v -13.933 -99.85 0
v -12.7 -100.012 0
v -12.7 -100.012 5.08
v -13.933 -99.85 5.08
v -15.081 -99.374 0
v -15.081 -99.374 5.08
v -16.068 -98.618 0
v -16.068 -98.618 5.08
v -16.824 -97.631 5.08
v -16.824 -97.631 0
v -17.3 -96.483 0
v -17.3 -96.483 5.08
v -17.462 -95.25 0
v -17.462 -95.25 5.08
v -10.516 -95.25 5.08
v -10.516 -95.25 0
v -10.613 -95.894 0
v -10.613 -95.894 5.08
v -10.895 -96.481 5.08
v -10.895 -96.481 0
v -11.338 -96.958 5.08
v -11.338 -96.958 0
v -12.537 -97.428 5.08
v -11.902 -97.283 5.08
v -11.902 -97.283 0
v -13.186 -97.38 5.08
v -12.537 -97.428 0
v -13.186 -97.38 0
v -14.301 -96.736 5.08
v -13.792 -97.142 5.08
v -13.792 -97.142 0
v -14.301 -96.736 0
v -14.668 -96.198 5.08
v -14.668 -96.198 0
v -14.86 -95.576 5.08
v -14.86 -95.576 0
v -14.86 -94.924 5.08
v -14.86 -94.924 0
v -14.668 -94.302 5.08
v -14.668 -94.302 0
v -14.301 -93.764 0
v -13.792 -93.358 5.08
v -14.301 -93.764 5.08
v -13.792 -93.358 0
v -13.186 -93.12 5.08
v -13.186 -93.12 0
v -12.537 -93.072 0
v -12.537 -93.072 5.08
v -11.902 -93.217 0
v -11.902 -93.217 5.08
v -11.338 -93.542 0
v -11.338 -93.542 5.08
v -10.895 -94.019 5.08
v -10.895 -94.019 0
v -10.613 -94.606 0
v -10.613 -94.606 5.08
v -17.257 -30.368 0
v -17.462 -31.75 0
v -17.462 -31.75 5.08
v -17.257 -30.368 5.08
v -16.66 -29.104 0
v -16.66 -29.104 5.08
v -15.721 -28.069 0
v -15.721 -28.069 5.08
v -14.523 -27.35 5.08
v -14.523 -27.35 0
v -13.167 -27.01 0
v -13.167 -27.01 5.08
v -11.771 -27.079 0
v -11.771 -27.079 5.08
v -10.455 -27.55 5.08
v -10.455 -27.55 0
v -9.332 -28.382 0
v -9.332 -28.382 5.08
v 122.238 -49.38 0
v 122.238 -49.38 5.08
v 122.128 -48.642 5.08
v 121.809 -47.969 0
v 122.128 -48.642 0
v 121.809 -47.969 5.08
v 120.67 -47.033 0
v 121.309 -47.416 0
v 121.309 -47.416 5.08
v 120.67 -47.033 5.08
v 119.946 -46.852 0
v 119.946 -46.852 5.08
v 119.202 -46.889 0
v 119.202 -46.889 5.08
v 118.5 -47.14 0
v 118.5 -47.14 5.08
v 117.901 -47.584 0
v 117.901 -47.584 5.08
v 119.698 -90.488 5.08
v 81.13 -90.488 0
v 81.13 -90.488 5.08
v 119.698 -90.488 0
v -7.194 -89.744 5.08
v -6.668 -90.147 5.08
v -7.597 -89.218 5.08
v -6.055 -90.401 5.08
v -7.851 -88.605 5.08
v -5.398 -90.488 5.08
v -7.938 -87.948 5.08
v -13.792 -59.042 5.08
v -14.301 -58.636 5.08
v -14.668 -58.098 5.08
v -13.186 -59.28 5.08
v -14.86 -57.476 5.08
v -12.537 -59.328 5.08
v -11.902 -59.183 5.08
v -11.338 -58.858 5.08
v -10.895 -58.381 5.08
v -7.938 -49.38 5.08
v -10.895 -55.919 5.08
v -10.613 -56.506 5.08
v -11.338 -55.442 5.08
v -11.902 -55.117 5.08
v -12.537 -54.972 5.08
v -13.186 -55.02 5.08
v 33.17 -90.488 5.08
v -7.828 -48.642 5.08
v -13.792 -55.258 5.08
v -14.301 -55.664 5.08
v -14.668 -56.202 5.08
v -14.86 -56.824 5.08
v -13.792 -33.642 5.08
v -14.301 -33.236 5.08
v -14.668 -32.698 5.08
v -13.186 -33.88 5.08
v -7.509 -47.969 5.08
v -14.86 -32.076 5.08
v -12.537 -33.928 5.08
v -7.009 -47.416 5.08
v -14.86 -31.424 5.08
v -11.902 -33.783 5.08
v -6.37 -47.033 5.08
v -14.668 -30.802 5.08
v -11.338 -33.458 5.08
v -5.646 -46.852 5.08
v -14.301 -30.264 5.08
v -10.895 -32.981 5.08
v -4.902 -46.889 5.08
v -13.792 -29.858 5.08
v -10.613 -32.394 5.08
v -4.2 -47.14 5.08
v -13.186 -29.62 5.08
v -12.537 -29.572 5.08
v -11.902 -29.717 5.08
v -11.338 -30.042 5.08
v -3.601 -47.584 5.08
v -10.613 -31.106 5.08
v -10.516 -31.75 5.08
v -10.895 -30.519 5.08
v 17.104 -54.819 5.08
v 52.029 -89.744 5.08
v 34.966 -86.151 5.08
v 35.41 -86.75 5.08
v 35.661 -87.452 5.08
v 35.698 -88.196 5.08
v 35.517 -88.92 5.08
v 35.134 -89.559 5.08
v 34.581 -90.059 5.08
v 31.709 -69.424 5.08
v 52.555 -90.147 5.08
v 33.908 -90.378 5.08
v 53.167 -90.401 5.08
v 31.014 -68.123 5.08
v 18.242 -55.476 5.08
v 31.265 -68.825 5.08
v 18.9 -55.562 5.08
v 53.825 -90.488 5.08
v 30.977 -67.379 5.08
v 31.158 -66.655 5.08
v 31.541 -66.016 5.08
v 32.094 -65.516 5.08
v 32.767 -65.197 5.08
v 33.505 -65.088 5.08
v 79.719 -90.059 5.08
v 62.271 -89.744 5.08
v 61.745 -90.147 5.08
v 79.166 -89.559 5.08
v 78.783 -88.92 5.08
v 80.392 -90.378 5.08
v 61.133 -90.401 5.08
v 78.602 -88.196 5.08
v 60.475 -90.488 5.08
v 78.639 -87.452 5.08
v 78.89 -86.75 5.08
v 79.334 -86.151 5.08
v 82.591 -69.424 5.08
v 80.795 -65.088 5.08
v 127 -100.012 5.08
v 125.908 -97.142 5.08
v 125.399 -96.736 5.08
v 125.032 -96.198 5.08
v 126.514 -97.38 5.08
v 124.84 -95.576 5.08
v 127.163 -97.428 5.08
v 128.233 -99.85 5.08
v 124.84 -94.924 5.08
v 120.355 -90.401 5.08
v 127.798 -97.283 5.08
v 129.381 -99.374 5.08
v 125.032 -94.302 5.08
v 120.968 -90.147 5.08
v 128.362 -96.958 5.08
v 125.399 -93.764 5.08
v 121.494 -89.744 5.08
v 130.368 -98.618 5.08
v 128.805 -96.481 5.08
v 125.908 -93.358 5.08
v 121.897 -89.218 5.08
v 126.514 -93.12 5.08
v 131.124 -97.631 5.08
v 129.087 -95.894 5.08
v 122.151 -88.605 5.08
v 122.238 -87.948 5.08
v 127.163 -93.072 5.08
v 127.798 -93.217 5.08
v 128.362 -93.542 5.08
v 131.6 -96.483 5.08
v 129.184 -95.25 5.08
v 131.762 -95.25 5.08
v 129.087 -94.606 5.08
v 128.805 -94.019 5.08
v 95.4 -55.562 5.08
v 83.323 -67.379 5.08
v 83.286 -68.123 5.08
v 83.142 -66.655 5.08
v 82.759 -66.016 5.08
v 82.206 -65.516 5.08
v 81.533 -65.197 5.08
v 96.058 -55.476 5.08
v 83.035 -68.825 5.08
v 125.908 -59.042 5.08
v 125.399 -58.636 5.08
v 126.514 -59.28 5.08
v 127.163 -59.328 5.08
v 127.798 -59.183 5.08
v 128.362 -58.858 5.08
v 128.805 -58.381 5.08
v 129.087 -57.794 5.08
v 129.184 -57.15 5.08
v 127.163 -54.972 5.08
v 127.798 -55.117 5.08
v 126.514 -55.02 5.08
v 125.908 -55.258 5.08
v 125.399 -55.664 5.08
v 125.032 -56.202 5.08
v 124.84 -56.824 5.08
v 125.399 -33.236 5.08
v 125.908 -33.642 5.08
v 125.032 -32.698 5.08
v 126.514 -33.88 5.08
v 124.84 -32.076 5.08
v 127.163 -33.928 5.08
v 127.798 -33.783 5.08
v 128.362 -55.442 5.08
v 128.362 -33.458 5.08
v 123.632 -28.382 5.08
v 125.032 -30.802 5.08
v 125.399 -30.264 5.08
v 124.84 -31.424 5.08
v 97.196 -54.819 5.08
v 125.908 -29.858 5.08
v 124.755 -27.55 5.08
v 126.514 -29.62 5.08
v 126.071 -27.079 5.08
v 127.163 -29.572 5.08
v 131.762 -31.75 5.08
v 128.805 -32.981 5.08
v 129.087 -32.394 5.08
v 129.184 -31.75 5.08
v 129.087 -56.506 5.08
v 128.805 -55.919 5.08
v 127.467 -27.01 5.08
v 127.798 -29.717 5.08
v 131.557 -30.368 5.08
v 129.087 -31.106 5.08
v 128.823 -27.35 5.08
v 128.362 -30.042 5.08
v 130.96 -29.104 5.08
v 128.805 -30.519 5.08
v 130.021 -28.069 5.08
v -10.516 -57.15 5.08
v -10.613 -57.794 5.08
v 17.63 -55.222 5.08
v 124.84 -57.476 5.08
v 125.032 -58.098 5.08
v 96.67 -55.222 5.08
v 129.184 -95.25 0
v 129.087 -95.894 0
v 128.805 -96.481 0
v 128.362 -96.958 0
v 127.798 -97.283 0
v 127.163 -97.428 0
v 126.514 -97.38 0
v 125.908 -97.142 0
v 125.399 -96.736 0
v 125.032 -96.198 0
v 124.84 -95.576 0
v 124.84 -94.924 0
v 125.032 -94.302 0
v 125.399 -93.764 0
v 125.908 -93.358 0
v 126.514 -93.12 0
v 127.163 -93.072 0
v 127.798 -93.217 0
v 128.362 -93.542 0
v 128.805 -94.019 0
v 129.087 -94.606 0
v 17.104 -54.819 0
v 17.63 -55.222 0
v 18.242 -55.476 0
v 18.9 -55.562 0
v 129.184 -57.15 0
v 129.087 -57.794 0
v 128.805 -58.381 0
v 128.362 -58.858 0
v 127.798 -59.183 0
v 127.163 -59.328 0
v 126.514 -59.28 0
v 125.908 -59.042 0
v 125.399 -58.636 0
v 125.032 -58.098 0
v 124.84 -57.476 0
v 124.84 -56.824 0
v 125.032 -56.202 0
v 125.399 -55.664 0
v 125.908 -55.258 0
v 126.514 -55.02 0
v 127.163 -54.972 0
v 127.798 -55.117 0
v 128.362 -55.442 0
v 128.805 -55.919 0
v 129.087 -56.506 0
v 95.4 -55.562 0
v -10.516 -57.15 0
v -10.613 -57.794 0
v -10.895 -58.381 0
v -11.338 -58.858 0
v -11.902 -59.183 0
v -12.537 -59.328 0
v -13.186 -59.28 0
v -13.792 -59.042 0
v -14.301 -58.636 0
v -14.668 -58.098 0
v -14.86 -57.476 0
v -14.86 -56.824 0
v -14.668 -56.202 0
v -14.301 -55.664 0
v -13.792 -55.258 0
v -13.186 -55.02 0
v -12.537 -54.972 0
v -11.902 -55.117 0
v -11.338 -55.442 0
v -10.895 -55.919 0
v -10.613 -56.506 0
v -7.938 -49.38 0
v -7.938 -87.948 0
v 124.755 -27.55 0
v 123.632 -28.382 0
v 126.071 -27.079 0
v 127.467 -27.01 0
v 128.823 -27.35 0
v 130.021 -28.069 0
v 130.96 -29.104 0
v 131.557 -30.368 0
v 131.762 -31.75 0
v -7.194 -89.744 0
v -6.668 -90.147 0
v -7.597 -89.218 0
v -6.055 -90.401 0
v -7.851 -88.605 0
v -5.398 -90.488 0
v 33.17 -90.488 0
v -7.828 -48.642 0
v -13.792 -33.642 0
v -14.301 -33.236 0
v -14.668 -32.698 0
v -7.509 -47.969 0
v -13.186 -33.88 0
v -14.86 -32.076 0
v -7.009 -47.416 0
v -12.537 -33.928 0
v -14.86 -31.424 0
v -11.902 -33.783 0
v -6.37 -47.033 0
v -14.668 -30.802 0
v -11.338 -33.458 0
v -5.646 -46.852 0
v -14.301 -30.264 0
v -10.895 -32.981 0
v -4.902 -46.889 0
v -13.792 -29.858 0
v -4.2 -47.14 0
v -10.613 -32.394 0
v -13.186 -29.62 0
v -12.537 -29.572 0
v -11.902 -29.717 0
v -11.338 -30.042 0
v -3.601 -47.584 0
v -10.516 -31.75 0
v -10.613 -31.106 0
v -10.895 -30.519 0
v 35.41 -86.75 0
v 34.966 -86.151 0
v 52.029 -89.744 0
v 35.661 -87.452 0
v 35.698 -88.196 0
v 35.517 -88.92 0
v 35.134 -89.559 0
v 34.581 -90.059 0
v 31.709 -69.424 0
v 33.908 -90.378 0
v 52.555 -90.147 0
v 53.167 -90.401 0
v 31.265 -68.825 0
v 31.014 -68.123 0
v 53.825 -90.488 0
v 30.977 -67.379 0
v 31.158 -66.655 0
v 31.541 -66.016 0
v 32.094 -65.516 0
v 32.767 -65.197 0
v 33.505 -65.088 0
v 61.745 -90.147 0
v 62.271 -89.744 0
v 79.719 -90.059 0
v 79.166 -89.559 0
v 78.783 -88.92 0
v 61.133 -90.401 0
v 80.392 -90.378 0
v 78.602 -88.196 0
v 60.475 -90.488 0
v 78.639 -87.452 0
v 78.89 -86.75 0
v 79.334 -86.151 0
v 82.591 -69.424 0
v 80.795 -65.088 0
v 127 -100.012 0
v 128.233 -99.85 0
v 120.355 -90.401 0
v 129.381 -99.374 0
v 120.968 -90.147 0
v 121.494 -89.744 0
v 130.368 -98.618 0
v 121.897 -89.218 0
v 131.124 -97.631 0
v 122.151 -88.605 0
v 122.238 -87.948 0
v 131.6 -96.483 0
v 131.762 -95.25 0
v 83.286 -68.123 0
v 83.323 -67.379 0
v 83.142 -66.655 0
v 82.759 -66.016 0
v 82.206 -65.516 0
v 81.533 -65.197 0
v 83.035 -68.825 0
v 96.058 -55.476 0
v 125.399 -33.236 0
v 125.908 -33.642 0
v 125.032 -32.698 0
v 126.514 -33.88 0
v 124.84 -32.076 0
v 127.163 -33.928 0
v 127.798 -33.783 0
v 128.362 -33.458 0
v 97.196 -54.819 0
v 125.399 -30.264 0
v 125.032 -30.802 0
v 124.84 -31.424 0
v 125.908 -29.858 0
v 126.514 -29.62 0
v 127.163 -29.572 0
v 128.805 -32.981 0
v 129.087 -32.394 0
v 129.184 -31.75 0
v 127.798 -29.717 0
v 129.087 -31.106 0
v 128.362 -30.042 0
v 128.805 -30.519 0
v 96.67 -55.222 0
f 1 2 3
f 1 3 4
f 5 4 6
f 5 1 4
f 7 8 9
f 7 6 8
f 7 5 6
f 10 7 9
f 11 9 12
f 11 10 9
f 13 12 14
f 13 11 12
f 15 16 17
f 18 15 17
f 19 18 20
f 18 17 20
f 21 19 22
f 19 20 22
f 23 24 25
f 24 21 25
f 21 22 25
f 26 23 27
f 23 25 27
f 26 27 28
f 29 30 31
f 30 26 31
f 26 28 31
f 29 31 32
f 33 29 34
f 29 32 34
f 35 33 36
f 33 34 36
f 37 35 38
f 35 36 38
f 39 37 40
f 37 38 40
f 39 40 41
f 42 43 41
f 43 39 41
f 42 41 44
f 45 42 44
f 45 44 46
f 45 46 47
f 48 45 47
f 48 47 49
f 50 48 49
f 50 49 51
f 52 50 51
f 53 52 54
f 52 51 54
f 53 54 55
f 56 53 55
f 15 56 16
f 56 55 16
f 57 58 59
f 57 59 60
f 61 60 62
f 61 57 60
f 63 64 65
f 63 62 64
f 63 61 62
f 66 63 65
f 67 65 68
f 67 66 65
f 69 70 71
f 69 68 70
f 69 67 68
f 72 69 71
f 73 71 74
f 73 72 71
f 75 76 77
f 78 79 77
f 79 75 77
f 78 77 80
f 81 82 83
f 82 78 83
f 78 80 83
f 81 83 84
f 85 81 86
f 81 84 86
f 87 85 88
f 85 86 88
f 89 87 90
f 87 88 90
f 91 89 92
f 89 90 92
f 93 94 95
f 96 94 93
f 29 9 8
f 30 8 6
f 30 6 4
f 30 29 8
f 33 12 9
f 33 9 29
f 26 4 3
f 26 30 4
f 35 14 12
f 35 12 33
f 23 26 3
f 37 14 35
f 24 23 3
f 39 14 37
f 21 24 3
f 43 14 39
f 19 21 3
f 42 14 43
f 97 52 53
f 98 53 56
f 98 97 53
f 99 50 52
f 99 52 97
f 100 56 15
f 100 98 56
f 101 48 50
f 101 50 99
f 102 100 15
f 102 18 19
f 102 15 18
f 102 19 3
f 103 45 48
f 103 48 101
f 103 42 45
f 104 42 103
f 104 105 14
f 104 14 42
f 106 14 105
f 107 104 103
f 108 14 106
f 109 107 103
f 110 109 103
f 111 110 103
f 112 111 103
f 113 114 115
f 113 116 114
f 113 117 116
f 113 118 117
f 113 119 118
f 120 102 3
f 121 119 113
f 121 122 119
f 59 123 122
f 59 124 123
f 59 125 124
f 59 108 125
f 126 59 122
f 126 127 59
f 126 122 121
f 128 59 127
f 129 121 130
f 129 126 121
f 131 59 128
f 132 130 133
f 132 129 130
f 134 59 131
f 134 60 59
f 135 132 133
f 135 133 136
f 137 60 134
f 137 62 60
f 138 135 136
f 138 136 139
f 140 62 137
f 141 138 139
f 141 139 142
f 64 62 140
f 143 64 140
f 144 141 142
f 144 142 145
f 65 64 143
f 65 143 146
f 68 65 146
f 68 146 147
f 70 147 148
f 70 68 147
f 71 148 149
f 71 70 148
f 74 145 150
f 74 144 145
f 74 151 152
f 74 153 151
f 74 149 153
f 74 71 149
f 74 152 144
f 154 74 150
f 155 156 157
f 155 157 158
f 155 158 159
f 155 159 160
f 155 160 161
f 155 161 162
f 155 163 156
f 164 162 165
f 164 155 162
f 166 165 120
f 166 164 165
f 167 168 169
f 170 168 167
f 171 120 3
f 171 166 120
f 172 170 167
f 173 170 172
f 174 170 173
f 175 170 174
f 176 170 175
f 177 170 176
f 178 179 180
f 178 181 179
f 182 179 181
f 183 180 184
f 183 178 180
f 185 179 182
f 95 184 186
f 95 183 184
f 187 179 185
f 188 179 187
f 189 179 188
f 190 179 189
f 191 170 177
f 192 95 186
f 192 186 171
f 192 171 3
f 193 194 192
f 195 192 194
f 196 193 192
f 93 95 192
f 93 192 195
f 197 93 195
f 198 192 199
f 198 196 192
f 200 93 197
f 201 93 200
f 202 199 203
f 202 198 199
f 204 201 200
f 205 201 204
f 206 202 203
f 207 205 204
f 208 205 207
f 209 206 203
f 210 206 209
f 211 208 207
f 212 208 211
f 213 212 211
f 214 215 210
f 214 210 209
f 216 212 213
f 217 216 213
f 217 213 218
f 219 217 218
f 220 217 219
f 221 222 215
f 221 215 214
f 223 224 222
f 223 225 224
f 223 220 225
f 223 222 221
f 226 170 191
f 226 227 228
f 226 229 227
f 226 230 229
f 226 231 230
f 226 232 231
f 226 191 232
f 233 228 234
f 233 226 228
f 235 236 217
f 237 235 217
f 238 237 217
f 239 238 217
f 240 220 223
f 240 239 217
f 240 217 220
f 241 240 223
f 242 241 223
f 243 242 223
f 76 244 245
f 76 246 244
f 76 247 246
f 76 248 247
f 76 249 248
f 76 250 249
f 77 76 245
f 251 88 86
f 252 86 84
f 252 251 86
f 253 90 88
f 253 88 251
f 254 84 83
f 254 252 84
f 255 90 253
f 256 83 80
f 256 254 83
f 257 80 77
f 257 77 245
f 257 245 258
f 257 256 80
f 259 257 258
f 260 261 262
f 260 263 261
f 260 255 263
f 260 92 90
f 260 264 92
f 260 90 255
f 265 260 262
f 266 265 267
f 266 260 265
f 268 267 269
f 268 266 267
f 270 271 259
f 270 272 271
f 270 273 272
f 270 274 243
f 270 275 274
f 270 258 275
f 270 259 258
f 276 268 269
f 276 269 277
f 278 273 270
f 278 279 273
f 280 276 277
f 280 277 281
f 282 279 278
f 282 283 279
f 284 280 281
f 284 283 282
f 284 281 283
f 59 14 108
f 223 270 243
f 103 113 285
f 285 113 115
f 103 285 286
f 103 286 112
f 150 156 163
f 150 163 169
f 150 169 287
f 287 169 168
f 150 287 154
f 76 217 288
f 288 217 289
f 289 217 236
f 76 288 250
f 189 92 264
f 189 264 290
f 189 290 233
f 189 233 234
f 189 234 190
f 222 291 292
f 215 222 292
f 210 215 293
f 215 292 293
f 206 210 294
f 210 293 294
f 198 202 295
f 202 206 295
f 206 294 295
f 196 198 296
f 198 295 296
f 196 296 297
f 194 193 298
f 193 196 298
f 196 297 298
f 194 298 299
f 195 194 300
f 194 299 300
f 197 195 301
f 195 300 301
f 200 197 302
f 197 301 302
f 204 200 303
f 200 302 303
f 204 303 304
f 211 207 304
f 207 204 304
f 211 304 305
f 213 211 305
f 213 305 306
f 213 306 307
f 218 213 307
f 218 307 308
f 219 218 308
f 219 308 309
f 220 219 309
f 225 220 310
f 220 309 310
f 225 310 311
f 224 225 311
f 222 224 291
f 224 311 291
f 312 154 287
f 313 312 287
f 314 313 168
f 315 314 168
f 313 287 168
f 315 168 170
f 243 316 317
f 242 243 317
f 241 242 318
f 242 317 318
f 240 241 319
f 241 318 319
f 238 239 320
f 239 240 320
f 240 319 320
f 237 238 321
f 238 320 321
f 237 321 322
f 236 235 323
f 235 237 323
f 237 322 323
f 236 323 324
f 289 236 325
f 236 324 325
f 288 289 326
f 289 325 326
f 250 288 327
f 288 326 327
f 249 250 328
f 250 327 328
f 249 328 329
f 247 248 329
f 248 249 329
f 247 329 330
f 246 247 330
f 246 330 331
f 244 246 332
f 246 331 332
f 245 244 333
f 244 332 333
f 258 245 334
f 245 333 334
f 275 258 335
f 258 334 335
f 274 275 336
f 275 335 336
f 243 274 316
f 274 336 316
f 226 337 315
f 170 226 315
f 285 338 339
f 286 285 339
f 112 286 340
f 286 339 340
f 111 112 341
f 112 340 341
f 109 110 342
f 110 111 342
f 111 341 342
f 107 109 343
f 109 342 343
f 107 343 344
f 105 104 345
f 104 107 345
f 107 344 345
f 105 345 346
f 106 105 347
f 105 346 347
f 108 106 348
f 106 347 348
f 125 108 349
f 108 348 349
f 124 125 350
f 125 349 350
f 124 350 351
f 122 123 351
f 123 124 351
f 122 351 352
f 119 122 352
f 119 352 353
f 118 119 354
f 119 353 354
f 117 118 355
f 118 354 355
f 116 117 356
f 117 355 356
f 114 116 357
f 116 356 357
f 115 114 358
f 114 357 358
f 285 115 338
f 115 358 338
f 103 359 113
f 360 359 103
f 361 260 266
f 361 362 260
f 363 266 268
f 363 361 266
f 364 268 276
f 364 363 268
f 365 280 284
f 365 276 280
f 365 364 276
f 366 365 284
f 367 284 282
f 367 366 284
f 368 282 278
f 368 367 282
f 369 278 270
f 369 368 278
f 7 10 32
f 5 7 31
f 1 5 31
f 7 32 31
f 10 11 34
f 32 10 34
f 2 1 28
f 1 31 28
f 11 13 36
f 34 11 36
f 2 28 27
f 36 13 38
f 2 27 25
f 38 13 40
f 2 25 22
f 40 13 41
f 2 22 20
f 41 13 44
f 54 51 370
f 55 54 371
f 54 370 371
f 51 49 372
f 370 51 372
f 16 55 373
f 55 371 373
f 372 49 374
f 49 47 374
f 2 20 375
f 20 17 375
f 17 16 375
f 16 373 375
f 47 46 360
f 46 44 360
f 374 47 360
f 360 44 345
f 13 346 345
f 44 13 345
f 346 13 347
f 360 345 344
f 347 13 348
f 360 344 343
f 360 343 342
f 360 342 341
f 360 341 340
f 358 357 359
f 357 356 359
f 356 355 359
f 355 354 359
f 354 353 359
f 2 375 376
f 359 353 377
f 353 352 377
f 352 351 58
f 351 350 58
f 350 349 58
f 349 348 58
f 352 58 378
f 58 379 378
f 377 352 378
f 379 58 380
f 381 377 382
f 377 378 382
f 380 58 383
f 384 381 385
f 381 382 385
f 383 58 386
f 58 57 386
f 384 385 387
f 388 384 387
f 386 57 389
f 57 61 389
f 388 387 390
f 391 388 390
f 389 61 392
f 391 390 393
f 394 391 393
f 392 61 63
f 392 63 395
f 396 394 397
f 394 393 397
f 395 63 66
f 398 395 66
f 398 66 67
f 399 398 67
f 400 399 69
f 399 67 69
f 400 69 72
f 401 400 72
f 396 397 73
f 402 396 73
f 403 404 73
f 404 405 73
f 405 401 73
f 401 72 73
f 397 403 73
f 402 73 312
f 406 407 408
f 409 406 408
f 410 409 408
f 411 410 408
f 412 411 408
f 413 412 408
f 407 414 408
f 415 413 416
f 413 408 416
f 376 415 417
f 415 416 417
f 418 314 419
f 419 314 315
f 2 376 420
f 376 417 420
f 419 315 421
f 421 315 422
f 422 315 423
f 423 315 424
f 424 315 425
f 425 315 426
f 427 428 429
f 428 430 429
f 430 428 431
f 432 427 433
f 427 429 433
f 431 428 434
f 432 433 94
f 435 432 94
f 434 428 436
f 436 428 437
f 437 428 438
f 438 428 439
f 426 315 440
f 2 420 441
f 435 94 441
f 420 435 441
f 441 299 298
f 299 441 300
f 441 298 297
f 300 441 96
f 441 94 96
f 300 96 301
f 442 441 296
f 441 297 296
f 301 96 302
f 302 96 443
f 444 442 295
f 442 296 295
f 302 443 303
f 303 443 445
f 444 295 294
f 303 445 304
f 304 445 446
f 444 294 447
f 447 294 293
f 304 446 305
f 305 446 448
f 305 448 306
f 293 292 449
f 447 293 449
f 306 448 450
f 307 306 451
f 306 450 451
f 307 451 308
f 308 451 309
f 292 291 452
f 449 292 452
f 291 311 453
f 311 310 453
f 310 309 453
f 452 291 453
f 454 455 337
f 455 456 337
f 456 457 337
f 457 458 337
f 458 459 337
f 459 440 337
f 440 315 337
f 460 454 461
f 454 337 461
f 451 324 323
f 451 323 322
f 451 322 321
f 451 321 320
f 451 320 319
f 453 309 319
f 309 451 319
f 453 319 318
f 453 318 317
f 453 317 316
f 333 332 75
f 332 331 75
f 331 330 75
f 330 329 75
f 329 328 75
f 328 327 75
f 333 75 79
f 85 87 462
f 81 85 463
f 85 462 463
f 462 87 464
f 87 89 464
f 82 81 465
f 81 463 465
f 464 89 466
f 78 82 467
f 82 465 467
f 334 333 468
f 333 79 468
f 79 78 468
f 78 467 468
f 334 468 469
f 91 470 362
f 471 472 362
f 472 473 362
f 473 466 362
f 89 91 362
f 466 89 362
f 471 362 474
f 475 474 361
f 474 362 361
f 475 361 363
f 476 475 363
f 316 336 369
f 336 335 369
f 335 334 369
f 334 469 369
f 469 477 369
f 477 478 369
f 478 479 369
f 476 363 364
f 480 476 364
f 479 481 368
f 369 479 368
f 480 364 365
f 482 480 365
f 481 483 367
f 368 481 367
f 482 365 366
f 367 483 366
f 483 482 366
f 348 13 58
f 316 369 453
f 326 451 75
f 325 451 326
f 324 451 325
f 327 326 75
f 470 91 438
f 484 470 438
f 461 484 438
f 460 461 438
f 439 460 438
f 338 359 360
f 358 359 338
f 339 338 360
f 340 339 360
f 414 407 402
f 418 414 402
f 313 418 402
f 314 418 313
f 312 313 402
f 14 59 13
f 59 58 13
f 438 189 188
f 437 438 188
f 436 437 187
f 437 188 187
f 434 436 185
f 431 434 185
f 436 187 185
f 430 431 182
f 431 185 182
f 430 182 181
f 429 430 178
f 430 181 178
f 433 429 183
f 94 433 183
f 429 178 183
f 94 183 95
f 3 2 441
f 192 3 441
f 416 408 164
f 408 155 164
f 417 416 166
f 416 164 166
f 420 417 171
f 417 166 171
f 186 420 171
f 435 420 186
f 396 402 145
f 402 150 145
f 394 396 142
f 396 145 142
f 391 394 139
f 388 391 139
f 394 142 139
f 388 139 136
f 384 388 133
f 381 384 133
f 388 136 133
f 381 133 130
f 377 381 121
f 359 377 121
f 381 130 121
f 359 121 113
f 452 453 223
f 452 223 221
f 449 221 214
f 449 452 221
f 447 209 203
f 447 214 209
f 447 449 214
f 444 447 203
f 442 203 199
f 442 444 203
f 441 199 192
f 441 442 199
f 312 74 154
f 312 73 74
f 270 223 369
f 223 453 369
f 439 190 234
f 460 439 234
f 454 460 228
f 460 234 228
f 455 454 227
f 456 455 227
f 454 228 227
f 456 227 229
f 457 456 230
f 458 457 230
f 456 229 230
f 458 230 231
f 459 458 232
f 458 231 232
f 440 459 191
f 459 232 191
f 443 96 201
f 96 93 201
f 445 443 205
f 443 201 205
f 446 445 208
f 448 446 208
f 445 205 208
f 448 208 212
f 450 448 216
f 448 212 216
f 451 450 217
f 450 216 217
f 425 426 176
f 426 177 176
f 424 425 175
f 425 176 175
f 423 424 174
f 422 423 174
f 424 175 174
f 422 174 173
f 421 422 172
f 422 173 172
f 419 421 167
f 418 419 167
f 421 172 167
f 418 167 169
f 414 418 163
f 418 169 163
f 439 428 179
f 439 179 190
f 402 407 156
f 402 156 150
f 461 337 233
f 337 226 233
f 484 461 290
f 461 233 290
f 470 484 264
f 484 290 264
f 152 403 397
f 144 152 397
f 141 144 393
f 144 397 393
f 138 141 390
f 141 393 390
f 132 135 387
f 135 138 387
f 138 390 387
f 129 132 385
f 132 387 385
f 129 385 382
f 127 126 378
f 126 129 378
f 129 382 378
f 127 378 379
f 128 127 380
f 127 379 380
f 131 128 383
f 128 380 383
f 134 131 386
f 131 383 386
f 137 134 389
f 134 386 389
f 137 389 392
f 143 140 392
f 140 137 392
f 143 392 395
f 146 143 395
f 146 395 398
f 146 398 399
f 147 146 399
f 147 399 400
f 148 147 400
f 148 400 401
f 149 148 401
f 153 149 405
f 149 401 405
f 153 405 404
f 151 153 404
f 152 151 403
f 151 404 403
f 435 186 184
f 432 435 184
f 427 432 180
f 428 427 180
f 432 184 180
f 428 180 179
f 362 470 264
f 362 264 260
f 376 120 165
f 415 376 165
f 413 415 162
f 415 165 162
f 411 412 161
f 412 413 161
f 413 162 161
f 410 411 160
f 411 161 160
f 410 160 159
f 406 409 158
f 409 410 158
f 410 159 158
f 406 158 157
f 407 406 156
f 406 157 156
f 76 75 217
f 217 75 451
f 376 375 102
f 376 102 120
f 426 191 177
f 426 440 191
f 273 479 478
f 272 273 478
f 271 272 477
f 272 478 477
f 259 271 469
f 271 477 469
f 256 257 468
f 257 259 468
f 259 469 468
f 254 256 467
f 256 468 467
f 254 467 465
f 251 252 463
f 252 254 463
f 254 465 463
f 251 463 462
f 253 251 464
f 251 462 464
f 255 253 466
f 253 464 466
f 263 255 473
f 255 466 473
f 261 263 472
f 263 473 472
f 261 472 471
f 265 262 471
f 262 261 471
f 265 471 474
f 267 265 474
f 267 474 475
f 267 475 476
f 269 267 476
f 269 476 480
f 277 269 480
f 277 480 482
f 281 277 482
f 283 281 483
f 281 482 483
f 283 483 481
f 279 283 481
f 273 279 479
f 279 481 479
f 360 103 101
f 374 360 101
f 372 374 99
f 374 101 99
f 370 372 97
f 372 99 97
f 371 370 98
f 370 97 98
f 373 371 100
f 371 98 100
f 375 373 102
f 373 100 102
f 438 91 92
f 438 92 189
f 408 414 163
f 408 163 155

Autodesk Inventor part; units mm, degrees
ref_plane "YZ Plane" through (0, 0, 0) normal (1, 0, 0) x (0, 1, 0)
ref_plane "XZ Plane" through (0, 0, 0) normal (0, 1, 0) x (-1, 0, 0)
ref_plane "XY Plane" through (0, 0, 0) normal (0, 0, 1) x (1, 0, 0)
sketch "Sketch1" plane through (0, 0, 0) normal (0, 0, 1) x (1, 0, 0)
  circle A0 centre (-12.7, -31.75) radius 2.1844 projected
  circle A1 centre (127, -31.75) radius 2.1844 projected
  circle A2 centre (-12.7, -95.25) radius 2.1844 projected
  circle A3 centre (127, -95.25) radius 2.1844 projected
  arc A4 (-17.4625, -95.25) -> (-12.7, -100.0125) centre (-12.7, -95.25) ccw
  arc A5 (-9.3324, -28.3824) -> (-17.4625, -31.75) centre (-12.7, -31.75) ccw
  arc A6 (131.7625, -31.75) -> (123.6324, -28.3824) centre (127, -31.75) ccw
  arc A7 (127, -100.0125) -> (131.7625, -95.25) centre (127, -95.25) ccw
  line L0 (-17.4625, -31.75) -> (-17.4625, -95.25)
  line L1 (-12.7, -100.0125) -> (127, -100.0125)
  line L2 (131.7625, -95.25) -> (131.7625, -31.75)
  line L3 (39.3023, -90.4875) -> (-7.9375, -43.2477)
  line L4 (-7.9375, -43.2477) -> (-7.9375, -90.4875)
  line L5 (122.2375, -43.2477) -> (122.2375, -90.4875)
  line L6 (122.2375, -43.2477) -> (74.9977, -90.4875)
  line L7 (57.15, -100.0125) -> (57.15, -90.4875) construction
  line L8 (-7.9375, -90.4875) -> (39.3023, -90.4875)
  line L9 (52.7727, -90.4875) -> (61.5273, -90.4875)
  line L10 (74.9977, -90.4875) -> (122.2375, -90.4875)
  line L11 (86.9273, -65.0875) -> (27.3727, -65.0875)
  line L12 (96.4523, -55.5625) -> (17.8477, -55.5625)
  line L13 (61.5273, -90.4875) -> (86.9273, -65.0875)
  line L14 (96.4523, -55.5625) -> (123.6324, -28.3824)
  line L15 (-9.3324, -28.3824) -> (17.8477, -55.5625)
  line L16 (27.3727, -65.0875) -> (52.7727, -90.4875)
  circle A8 centre (-12.7, -57.15) radius 2.1844 projected
  circle A9 centre (127, -57.15) radius 2.1844 projected
  point P0 (0, 0)
  dimension "d0" = 9.525
  dimension "d8" = 9.525
  dimension "d9" = 25.4
  dimension "d10" = 45
extrude "Extrusion1" add sketch "Sketch1" along normal blind 5.08
fillet "Fillet2" radius 2.54 6 edges at (39.3023, -90.4875, 2.54) (74.9977, -90.4875, 2.54) (122.2375, -43.2477, 2.54) (122.2375, -90.4875, 2.54) (-7.9375, -43.2477, 2.54) (-7.9375, -90.4875, 2.54)
fillet "Fillet3" radius 2.54 6 edges at (27.3727, -65.0875, 2.54) (86.9273, -65.0875, 2.54) (96.4523, -55.5625, 2.54) (17.8477, -55.5625, 2.54) (61.5273, -90.4875, 2.54) (52.7727, -90.4875, 2.54)
properties part number "hoodbrace"
